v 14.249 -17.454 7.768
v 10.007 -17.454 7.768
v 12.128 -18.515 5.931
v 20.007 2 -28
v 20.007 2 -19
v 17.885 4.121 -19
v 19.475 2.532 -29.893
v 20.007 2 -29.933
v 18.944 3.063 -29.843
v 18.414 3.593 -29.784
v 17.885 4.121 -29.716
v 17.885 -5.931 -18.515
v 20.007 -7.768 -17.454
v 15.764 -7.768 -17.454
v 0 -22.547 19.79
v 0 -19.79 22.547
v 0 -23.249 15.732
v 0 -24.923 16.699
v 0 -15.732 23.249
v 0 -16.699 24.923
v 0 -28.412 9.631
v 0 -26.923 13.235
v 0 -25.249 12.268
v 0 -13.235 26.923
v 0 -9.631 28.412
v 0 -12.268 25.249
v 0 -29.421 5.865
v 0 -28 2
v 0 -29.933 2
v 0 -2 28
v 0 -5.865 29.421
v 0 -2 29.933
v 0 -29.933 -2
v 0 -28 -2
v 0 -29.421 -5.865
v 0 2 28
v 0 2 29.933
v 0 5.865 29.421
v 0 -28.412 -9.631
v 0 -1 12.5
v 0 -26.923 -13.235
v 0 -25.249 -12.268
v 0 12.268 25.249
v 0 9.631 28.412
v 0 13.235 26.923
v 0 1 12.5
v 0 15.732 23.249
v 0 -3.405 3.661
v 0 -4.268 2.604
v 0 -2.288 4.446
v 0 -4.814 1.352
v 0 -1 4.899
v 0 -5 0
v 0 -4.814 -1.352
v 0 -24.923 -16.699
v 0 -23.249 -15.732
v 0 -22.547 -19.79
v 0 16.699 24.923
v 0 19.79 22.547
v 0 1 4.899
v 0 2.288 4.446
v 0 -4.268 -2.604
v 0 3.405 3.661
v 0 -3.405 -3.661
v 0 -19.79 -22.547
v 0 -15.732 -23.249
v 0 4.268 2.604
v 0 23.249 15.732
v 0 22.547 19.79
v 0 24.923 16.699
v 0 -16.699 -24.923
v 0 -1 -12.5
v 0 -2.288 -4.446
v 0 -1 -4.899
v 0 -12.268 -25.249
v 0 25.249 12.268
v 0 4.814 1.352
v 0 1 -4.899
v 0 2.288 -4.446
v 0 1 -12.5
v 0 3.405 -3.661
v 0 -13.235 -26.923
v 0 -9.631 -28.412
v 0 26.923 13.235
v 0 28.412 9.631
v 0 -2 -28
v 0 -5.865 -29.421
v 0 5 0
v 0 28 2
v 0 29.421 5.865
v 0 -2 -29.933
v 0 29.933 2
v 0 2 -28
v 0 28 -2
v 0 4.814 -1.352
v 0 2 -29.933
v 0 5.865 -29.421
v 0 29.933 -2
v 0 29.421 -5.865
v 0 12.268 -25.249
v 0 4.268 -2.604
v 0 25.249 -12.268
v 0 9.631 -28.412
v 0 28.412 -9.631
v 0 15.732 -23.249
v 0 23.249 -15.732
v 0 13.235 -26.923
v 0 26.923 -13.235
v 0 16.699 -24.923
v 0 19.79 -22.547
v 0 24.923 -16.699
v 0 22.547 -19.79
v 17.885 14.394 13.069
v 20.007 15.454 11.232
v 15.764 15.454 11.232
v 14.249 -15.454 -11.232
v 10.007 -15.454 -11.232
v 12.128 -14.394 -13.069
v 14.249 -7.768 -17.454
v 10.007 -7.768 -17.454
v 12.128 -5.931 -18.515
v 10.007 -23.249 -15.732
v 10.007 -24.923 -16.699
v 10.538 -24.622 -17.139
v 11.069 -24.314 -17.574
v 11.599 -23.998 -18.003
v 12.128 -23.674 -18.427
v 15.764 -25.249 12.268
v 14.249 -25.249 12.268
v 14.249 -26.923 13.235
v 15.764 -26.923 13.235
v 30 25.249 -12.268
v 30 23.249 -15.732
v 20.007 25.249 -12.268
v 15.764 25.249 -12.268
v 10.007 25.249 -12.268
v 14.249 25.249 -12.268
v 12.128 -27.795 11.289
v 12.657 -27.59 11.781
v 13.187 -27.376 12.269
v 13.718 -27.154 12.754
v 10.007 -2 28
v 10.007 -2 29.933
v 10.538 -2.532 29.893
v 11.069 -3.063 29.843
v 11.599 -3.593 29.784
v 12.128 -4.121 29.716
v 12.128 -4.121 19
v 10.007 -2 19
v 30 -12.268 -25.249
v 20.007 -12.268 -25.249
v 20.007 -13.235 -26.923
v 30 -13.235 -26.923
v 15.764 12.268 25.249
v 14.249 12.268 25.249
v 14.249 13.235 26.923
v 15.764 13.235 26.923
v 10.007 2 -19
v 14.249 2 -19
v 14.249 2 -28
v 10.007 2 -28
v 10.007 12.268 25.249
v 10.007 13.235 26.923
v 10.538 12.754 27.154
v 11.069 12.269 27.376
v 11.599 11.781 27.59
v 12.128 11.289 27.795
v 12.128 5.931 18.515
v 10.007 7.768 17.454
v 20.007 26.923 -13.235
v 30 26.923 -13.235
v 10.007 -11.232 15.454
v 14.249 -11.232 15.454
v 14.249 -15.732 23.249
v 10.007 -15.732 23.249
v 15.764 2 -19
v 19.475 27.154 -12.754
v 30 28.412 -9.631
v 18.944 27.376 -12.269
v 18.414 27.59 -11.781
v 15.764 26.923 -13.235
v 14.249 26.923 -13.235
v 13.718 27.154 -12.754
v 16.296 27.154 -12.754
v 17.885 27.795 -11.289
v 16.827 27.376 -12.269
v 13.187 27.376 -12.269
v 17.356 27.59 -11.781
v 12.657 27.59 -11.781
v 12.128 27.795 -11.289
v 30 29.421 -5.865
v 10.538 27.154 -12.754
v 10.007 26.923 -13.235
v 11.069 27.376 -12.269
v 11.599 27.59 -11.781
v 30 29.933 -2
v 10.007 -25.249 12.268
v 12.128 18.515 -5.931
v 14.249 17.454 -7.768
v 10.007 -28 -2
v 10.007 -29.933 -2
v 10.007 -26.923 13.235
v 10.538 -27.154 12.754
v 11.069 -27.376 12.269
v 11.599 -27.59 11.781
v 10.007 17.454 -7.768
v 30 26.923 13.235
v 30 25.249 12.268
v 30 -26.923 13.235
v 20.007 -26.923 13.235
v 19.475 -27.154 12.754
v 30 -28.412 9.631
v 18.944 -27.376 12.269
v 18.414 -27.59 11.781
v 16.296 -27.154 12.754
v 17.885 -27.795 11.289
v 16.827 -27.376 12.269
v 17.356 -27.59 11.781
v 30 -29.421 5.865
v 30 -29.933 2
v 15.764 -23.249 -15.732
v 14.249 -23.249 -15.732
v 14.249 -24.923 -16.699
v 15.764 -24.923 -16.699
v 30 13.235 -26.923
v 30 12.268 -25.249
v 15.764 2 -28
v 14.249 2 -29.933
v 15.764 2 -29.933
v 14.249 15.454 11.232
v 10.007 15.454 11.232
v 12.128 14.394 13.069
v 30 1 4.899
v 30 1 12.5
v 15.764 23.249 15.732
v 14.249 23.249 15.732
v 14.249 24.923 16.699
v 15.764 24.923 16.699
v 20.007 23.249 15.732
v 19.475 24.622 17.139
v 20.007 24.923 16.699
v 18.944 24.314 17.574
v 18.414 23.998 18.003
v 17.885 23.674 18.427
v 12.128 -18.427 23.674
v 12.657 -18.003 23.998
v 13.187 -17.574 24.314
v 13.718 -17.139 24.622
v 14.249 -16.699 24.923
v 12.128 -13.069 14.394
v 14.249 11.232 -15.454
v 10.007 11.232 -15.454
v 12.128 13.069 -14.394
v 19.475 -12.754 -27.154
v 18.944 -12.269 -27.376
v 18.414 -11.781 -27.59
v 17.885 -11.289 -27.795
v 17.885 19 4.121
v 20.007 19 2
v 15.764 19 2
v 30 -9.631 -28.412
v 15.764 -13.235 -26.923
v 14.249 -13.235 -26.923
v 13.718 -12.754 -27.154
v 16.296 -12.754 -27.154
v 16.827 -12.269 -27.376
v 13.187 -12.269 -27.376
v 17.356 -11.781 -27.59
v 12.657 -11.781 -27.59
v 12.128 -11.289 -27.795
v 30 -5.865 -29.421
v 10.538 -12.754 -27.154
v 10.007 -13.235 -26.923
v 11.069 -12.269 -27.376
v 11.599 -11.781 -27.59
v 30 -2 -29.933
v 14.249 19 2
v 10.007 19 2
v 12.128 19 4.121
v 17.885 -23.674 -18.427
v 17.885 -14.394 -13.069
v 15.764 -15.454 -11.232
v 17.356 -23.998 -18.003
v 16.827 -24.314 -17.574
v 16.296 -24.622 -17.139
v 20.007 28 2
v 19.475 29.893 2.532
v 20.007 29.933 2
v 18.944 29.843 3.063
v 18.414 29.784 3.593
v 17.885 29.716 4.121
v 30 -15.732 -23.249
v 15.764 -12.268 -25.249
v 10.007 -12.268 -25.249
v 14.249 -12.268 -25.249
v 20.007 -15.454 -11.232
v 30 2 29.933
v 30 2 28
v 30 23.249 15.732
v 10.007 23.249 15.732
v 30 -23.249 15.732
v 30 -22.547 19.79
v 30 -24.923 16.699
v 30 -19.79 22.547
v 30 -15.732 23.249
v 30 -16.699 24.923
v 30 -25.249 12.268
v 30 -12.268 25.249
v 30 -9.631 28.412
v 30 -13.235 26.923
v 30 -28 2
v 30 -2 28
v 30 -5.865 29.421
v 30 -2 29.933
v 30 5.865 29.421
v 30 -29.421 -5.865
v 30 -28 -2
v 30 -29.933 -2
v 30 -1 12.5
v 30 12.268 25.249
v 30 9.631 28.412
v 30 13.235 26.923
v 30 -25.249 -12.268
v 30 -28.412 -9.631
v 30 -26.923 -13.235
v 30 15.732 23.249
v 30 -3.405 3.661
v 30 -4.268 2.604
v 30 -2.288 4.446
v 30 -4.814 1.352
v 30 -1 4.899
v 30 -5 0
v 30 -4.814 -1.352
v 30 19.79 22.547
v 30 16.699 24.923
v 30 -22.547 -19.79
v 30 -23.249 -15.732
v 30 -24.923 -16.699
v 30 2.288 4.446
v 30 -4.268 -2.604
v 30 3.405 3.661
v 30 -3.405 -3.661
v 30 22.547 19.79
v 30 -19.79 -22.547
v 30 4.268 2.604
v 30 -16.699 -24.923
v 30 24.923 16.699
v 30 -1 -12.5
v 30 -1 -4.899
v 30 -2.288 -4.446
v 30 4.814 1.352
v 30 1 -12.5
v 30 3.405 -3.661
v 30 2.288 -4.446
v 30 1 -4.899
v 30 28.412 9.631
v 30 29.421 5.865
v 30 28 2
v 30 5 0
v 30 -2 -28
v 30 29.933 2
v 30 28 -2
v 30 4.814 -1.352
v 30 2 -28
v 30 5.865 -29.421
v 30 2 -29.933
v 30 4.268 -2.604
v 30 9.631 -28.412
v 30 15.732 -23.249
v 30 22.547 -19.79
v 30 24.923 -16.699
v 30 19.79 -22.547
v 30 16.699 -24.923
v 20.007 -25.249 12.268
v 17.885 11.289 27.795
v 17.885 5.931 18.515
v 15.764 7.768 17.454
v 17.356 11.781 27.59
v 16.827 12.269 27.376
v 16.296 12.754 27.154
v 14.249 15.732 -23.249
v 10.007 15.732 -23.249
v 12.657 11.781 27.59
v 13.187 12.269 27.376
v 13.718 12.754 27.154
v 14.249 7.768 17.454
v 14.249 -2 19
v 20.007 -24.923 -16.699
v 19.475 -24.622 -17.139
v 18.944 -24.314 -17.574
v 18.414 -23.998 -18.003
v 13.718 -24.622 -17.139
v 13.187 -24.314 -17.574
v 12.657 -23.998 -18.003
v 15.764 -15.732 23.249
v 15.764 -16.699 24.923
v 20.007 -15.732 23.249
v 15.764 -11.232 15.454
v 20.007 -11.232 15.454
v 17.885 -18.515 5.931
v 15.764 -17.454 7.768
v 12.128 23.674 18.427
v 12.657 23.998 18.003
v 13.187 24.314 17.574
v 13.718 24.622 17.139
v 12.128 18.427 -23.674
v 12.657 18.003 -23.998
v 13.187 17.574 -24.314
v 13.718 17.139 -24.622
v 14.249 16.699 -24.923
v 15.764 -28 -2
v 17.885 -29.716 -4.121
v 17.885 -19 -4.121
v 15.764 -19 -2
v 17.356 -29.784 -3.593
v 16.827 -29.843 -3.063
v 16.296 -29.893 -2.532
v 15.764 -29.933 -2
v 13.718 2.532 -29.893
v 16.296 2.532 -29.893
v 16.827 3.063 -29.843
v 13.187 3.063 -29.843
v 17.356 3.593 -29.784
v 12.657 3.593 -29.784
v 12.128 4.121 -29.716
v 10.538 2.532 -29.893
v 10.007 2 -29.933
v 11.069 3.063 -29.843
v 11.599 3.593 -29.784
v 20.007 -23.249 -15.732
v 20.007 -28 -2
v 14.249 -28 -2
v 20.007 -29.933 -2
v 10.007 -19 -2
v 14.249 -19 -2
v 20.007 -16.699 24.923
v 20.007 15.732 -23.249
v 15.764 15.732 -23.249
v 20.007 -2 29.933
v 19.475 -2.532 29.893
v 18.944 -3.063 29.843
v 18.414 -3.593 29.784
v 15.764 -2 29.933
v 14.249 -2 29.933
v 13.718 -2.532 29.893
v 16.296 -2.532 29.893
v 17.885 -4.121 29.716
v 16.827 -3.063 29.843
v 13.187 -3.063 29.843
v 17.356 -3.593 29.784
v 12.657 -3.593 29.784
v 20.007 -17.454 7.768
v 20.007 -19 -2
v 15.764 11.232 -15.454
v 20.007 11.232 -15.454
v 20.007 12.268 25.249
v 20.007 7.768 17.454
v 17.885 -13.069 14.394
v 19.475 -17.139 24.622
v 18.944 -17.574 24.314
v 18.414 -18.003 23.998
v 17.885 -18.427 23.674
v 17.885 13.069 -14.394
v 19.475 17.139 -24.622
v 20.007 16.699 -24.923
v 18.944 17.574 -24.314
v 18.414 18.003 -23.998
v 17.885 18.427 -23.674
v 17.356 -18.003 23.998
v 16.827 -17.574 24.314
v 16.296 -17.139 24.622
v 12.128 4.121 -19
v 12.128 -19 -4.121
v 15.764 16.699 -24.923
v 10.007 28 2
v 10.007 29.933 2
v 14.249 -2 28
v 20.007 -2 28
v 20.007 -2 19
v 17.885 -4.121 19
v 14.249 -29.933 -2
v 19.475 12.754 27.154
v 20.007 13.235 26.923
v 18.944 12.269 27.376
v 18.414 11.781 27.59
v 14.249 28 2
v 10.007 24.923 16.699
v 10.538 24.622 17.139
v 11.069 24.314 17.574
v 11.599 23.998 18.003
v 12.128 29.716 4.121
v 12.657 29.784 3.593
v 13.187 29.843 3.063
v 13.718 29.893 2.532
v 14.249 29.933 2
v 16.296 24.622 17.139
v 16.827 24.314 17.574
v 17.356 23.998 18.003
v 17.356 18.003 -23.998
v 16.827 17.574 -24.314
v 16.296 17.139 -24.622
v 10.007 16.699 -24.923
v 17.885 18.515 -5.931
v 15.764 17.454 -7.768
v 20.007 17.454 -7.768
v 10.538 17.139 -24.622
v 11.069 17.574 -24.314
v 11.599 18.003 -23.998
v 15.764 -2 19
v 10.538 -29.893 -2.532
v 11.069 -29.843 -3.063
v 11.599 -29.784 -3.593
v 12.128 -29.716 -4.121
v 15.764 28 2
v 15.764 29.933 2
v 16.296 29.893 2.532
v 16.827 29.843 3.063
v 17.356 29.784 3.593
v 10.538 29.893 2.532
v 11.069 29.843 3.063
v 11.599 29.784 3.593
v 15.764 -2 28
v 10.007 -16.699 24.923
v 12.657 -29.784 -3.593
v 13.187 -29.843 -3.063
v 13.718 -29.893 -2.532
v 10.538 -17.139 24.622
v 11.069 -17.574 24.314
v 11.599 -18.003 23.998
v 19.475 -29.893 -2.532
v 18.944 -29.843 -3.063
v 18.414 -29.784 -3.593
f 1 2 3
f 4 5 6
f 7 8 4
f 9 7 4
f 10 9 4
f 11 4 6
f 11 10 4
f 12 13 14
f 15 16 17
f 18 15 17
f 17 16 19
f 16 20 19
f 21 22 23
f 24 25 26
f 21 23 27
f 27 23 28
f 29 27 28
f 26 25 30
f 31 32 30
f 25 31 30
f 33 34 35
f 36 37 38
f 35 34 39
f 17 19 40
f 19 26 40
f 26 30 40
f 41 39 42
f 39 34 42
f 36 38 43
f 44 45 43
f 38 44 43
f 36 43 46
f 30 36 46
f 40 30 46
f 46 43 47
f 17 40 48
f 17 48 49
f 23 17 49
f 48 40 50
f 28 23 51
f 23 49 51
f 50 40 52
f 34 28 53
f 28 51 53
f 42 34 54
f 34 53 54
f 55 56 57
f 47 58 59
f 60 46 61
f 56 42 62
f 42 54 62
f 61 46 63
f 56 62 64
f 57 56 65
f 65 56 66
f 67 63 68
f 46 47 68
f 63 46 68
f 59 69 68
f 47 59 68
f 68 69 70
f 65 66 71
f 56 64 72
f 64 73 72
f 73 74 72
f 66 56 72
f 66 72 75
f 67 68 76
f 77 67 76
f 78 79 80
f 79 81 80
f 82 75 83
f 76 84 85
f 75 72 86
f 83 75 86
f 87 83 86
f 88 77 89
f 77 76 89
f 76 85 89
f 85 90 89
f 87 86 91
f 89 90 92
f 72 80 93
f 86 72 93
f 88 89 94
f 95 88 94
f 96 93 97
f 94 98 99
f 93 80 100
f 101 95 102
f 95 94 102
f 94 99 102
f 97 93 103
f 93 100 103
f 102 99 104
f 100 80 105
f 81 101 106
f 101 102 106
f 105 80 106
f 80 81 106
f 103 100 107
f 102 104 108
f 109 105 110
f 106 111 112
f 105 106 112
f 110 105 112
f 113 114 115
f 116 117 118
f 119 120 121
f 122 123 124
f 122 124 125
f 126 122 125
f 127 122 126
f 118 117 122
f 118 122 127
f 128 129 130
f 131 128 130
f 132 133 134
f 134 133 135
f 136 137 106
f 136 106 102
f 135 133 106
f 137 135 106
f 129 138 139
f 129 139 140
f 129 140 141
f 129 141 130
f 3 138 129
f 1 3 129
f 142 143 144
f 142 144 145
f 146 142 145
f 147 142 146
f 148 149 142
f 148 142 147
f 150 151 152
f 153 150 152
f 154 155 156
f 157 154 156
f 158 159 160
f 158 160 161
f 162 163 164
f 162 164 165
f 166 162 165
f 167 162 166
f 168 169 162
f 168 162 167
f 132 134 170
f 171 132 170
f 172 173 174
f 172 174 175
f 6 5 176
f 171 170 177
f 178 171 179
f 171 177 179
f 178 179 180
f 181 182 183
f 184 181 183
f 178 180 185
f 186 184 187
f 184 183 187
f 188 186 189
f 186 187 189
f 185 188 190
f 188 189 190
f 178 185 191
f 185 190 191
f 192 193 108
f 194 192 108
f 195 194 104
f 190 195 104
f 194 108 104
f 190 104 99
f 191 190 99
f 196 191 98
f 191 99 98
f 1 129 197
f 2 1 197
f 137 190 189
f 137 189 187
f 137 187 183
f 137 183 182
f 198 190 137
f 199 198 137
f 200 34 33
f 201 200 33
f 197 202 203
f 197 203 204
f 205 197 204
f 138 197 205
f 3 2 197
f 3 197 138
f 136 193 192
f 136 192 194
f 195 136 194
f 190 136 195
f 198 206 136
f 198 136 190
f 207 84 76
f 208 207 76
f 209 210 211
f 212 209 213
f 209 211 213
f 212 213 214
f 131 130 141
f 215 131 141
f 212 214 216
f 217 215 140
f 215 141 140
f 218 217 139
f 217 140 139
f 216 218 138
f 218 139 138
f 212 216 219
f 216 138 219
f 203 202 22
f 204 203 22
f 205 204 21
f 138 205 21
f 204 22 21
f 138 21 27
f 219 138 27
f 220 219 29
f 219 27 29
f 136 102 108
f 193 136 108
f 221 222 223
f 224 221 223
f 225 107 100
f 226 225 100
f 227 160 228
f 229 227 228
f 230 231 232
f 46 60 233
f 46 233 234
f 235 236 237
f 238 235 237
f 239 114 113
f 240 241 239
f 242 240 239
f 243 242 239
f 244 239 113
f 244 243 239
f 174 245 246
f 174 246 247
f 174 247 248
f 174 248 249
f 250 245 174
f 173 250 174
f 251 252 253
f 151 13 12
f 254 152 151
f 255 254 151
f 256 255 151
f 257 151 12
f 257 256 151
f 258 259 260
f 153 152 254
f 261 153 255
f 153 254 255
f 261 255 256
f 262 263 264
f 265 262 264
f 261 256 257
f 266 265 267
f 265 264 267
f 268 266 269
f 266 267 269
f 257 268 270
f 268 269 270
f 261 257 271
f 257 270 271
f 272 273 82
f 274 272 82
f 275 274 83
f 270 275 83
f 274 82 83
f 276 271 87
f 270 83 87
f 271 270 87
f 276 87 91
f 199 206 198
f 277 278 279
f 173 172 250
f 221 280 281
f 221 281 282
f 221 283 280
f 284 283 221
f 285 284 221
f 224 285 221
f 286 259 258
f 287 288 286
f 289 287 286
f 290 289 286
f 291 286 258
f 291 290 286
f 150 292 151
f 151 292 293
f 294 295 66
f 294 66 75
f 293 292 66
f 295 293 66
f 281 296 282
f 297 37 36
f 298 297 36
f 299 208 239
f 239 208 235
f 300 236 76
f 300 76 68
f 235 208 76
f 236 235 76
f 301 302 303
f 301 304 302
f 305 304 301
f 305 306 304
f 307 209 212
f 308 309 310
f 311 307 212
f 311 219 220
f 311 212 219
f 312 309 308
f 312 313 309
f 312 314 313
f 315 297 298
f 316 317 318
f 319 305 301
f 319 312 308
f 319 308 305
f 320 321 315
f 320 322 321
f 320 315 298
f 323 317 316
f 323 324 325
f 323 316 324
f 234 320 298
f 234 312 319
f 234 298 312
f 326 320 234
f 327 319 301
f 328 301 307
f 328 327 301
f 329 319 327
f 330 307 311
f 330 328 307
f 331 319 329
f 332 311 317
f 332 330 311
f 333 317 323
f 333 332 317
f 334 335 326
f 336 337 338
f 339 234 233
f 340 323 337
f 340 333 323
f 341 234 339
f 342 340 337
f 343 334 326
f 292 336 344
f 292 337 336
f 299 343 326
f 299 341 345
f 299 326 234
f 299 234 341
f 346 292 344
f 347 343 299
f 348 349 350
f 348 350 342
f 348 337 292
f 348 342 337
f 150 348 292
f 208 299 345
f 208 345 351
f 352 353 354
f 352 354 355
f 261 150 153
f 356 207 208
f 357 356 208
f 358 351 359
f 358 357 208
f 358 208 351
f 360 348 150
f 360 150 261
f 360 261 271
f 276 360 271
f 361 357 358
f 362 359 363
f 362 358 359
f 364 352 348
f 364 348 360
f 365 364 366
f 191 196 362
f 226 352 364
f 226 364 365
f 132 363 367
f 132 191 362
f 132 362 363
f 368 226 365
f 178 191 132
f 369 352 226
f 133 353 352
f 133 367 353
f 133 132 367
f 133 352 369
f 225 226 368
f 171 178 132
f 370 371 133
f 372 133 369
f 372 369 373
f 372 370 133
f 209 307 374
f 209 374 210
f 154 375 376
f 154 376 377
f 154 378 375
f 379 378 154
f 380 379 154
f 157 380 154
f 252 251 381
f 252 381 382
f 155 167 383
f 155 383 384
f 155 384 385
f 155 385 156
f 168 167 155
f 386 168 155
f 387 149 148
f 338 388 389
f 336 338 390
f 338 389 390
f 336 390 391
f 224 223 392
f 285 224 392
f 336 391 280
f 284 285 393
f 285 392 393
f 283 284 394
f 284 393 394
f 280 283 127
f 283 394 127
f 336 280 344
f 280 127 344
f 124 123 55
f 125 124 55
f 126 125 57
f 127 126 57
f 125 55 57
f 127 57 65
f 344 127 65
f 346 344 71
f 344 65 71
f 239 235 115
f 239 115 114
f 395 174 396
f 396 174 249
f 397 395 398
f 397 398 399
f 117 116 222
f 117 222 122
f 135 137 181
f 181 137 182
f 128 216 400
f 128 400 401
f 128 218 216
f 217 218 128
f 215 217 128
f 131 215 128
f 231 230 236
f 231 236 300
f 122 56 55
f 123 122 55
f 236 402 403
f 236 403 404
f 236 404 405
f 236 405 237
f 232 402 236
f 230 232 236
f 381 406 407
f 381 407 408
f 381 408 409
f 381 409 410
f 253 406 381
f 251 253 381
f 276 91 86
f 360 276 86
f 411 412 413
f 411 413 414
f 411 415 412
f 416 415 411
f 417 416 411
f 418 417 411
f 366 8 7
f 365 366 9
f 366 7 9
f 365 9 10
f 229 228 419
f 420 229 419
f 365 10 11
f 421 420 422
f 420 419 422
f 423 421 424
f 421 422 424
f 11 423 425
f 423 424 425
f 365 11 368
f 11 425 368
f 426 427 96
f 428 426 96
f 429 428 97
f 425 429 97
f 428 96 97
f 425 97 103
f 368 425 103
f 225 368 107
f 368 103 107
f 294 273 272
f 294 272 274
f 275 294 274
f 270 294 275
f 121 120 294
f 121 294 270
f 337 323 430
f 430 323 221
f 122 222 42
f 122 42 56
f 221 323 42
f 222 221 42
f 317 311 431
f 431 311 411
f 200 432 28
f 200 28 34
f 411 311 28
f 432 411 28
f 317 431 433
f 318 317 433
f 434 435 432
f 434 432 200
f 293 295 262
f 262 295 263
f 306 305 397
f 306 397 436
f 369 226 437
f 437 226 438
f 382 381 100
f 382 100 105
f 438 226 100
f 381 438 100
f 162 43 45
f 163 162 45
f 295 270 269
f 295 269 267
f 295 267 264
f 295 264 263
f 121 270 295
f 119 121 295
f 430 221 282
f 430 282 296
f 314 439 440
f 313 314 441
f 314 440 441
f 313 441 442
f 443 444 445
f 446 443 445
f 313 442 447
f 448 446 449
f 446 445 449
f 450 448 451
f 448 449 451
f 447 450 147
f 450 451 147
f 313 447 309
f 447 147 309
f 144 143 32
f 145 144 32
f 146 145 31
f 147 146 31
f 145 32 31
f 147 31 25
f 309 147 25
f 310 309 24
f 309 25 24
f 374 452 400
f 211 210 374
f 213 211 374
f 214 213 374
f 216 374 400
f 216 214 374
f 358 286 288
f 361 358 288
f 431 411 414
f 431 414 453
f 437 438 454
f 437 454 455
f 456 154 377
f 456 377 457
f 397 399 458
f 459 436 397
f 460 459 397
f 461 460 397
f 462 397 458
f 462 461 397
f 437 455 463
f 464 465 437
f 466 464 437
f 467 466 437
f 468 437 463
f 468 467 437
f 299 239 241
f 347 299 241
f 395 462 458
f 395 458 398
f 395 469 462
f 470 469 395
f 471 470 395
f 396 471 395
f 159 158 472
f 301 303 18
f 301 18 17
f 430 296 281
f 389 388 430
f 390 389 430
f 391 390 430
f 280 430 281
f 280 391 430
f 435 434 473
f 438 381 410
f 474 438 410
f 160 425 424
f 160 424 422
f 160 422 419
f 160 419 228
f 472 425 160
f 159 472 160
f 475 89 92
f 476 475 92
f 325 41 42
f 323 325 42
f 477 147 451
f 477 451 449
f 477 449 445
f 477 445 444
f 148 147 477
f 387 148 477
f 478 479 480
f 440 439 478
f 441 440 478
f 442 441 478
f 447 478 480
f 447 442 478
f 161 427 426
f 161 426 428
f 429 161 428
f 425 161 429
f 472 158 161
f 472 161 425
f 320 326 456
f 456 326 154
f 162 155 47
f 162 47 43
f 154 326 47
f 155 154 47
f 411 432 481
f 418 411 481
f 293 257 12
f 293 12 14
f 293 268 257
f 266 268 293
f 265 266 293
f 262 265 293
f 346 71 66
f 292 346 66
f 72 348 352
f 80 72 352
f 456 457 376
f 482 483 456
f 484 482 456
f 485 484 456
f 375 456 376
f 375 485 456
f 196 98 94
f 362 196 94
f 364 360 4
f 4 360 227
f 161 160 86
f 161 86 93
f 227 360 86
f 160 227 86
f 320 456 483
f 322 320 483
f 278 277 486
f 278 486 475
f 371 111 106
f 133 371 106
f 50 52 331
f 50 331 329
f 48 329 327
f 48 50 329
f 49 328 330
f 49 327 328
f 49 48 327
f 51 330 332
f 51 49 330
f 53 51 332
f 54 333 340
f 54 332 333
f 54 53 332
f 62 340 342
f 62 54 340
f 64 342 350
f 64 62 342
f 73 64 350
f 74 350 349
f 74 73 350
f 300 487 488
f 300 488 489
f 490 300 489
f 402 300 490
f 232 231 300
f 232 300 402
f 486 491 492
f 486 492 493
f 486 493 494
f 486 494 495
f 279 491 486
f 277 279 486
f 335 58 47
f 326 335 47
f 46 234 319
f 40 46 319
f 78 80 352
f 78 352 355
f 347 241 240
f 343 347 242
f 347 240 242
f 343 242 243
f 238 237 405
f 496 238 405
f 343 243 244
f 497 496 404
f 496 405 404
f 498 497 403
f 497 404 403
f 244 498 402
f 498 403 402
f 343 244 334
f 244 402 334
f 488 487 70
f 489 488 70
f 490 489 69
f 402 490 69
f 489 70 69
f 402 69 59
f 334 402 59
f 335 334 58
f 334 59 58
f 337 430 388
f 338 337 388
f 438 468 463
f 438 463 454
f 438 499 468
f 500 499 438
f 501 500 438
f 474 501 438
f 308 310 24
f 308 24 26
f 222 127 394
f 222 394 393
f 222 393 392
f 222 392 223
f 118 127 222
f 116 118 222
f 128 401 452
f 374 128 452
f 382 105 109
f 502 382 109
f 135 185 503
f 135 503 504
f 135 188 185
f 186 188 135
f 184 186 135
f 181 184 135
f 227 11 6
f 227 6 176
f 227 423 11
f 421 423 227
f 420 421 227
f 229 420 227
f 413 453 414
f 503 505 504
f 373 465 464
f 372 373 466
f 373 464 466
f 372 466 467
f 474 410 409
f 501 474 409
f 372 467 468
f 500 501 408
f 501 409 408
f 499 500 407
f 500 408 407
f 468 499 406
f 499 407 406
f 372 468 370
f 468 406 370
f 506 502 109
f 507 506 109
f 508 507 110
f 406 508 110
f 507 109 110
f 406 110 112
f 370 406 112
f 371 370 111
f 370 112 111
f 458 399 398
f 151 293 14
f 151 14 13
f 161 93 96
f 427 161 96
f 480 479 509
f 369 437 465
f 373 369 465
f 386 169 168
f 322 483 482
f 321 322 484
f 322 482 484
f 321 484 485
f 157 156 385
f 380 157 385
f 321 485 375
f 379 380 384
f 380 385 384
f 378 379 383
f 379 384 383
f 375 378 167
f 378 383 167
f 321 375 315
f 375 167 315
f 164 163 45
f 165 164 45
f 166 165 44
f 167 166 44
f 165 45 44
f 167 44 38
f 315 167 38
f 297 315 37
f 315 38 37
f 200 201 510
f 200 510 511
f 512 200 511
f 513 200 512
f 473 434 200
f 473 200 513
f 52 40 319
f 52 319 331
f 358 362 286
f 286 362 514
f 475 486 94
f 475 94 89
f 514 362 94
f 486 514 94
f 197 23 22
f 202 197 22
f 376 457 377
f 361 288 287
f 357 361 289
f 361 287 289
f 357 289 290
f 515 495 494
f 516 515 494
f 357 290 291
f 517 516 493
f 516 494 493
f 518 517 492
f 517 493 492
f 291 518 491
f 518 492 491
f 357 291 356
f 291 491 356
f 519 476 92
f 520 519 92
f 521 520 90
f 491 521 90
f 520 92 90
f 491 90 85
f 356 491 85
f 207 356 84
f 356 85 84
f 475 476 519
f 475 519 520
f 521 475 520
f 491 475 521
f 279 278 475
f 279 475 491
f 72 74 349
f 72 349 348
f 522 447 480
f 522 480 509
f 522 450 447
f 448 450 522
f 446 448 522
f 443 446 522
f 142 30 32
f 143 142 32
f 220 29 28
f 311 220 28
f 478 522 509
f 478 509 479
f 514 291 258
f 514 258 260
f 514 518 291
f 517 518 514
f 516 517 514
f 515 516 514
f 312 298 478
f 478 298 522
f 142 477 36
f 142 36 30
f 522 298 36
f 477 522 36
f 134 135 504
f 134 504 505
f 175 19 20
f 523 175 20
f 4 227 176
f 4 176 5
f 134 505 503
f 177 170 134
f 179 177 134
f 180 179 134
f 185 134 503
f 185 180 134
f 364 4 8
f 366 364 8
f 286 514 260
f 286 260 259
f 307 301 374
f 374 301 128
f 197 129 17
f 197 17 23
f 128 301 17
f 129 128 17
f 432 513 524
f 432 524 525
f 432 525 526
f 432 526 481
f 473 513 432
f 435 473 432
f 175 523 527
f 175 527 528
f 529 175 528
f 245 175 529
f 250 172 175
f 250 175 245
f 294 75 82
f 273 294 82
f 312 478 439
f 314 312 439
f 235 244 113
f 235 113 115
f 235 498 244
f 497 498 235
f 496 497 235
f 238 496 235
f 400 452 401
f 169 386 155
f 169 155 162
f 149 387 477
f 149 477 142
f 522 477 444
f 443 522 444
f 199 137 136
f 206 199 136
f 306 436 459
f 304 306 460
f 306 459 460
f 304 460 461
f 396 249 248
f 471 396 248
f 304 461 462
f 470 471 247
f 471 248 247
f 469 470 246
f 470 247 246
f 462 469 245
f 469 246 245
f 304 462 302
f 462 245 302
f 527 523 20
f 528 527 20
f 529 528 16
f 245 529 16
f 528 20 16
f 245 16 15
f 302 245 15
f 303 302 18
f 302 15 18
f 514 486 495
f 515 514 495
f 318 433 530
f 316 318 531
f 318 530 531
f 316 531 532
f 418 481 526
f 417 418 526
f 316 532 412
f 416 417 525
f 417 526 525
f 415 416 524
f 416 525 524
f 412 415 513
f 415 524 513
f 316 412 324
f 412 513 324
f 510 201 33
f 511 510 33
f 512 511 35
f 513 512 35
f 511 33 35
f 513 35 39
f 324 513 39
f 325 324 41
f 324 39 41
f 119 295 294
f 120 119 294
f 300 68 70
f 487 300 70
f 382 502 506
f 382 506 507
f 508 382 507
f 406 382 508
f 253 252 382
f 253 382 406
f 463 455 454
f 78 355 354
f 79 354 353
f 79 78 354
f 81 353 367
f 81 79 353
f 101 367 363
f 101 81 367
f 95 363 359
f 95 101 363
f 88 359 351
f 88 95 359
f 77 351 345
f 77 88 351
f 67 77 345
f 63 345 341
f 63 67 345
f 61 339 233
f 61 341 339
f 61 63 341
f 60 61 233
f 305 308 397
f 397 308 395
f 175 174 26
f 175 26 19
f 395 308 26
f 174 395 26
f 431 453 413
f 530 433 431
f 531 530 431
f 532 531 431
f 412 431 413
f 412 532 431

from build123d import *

# Parameters (mm, degrees)
SKETCH_1_R               = 30
EXTRUDE_1_DEPTH          = 30
CUT_EXTRUDE_1_DEPTH      = 52.961524227
CUT_EXTRUDE_2_DEPTH      = 52.961524227
CUT_EXTRUDE_3_DEPTH      = 9
PATTERN_CIRCULAR_2_COUNT = 12


with BuildPart() as part:
    # 草图1 → 凸台-拉伸1 (new body)
    with BuildSketch(Plane(origin=(0, 0, 0), x_dir=(0, 0, -1), z_dir=(1, 0, 0))):
        Circle(SKETCH_1_R)
    extrude(amount=EXTRUDE_1_DEPTH)

    # 草图2 → 切除-拉伸1 (cut, through all)
    with BuildSketch(Plane(origin=(0, 0, 0), x_dir=(0, 0, -1), z_dir=(1, 0, 0))):
        Polygon((0, 30), (2, 30), (2, 28), (-2, 28), (-2, 30), align=None)
    cut_extrude_1 = extrude(amount=CUT_EXTRUDE_1_DEPTH, mode=Mode.SUBTRACT)

    # 草图3 → 切除-拉伸2 (cut, through all)
    with BuildSketch(Plane(origin=(0, 0, 0), x_dir=(0, 0, -1), z_dir=(1, 0, 0))):
        with BuildLine():
            Line((4.898979486, -0.999999998), (12.500084161, -0.999999998))
            Line((12.500084161, -0.999999998), (12.5, 1))
            Line((12.5, 1), (4.898979486, 1))
            ThreePointArc((4.898979486, 1), (0, 5), (-4.898979486, 1))
            Line((-4.898979486, 1), (-12.5, 1))
            Line((-12.5, 1), (-12.499915839, -0.999999998))
            Line((-12.499915839, -0.999999998), (-4.898979486, -0.999999998))
            ThreePointArc((-4.898979486, -0.999999998), (0, -5), (4.898979486, -0.999999998))
        make_face()
    extrude(amount=CUT_EXTRUDE_2_DEPTH, mode=Mode.SUBTRACT)

    # 草图4 → 切除-拉伸3 (cut, symmetric)
    with BuildSketch(Plane(origin=(0, 28, 0), x_dir=(1, 0, 0), z_dir=(0, 1, 0))):
        Polygon((14.249202979, -2), (10.006562292, -2), (12.127882636, -4.121320344), align=None)
        Polygon((15.763921605, -2), (20.006562292, -2), (17.885241949, -4.121320344), align=None)
    cut_extrude_3 = extrude(amount=CUT_EXTRUDE_3_DEPTH, both=True, mode=Mode.SUBTRACT)

    # 阵列(圆周)2: 切除-拉伸1, 切除-拉伸3 ×12 about axis
    pattern_circular_2_axis = Axis((30, 0, 0), (-1, 0, 0))
    add([cut_extrude_1.rotate(pattern_circular_2_axis, i * 360 / PATTERN_CIRCULAR_2_COUNT) for i in range(1, PATTERN_CIRCULAR_2_COUNT)], mode=Mode.SUBTRACT)
    add([cut_extrude_3.rotate(pattern_circular_2_axis, i * 360 / PATTERN_CIRCULAR_2_COUNT) for i in range(1, PATTERN_CIRCULAR_2_COUNT)], mode=Mode.SUBTRACT)


solid = part.part
